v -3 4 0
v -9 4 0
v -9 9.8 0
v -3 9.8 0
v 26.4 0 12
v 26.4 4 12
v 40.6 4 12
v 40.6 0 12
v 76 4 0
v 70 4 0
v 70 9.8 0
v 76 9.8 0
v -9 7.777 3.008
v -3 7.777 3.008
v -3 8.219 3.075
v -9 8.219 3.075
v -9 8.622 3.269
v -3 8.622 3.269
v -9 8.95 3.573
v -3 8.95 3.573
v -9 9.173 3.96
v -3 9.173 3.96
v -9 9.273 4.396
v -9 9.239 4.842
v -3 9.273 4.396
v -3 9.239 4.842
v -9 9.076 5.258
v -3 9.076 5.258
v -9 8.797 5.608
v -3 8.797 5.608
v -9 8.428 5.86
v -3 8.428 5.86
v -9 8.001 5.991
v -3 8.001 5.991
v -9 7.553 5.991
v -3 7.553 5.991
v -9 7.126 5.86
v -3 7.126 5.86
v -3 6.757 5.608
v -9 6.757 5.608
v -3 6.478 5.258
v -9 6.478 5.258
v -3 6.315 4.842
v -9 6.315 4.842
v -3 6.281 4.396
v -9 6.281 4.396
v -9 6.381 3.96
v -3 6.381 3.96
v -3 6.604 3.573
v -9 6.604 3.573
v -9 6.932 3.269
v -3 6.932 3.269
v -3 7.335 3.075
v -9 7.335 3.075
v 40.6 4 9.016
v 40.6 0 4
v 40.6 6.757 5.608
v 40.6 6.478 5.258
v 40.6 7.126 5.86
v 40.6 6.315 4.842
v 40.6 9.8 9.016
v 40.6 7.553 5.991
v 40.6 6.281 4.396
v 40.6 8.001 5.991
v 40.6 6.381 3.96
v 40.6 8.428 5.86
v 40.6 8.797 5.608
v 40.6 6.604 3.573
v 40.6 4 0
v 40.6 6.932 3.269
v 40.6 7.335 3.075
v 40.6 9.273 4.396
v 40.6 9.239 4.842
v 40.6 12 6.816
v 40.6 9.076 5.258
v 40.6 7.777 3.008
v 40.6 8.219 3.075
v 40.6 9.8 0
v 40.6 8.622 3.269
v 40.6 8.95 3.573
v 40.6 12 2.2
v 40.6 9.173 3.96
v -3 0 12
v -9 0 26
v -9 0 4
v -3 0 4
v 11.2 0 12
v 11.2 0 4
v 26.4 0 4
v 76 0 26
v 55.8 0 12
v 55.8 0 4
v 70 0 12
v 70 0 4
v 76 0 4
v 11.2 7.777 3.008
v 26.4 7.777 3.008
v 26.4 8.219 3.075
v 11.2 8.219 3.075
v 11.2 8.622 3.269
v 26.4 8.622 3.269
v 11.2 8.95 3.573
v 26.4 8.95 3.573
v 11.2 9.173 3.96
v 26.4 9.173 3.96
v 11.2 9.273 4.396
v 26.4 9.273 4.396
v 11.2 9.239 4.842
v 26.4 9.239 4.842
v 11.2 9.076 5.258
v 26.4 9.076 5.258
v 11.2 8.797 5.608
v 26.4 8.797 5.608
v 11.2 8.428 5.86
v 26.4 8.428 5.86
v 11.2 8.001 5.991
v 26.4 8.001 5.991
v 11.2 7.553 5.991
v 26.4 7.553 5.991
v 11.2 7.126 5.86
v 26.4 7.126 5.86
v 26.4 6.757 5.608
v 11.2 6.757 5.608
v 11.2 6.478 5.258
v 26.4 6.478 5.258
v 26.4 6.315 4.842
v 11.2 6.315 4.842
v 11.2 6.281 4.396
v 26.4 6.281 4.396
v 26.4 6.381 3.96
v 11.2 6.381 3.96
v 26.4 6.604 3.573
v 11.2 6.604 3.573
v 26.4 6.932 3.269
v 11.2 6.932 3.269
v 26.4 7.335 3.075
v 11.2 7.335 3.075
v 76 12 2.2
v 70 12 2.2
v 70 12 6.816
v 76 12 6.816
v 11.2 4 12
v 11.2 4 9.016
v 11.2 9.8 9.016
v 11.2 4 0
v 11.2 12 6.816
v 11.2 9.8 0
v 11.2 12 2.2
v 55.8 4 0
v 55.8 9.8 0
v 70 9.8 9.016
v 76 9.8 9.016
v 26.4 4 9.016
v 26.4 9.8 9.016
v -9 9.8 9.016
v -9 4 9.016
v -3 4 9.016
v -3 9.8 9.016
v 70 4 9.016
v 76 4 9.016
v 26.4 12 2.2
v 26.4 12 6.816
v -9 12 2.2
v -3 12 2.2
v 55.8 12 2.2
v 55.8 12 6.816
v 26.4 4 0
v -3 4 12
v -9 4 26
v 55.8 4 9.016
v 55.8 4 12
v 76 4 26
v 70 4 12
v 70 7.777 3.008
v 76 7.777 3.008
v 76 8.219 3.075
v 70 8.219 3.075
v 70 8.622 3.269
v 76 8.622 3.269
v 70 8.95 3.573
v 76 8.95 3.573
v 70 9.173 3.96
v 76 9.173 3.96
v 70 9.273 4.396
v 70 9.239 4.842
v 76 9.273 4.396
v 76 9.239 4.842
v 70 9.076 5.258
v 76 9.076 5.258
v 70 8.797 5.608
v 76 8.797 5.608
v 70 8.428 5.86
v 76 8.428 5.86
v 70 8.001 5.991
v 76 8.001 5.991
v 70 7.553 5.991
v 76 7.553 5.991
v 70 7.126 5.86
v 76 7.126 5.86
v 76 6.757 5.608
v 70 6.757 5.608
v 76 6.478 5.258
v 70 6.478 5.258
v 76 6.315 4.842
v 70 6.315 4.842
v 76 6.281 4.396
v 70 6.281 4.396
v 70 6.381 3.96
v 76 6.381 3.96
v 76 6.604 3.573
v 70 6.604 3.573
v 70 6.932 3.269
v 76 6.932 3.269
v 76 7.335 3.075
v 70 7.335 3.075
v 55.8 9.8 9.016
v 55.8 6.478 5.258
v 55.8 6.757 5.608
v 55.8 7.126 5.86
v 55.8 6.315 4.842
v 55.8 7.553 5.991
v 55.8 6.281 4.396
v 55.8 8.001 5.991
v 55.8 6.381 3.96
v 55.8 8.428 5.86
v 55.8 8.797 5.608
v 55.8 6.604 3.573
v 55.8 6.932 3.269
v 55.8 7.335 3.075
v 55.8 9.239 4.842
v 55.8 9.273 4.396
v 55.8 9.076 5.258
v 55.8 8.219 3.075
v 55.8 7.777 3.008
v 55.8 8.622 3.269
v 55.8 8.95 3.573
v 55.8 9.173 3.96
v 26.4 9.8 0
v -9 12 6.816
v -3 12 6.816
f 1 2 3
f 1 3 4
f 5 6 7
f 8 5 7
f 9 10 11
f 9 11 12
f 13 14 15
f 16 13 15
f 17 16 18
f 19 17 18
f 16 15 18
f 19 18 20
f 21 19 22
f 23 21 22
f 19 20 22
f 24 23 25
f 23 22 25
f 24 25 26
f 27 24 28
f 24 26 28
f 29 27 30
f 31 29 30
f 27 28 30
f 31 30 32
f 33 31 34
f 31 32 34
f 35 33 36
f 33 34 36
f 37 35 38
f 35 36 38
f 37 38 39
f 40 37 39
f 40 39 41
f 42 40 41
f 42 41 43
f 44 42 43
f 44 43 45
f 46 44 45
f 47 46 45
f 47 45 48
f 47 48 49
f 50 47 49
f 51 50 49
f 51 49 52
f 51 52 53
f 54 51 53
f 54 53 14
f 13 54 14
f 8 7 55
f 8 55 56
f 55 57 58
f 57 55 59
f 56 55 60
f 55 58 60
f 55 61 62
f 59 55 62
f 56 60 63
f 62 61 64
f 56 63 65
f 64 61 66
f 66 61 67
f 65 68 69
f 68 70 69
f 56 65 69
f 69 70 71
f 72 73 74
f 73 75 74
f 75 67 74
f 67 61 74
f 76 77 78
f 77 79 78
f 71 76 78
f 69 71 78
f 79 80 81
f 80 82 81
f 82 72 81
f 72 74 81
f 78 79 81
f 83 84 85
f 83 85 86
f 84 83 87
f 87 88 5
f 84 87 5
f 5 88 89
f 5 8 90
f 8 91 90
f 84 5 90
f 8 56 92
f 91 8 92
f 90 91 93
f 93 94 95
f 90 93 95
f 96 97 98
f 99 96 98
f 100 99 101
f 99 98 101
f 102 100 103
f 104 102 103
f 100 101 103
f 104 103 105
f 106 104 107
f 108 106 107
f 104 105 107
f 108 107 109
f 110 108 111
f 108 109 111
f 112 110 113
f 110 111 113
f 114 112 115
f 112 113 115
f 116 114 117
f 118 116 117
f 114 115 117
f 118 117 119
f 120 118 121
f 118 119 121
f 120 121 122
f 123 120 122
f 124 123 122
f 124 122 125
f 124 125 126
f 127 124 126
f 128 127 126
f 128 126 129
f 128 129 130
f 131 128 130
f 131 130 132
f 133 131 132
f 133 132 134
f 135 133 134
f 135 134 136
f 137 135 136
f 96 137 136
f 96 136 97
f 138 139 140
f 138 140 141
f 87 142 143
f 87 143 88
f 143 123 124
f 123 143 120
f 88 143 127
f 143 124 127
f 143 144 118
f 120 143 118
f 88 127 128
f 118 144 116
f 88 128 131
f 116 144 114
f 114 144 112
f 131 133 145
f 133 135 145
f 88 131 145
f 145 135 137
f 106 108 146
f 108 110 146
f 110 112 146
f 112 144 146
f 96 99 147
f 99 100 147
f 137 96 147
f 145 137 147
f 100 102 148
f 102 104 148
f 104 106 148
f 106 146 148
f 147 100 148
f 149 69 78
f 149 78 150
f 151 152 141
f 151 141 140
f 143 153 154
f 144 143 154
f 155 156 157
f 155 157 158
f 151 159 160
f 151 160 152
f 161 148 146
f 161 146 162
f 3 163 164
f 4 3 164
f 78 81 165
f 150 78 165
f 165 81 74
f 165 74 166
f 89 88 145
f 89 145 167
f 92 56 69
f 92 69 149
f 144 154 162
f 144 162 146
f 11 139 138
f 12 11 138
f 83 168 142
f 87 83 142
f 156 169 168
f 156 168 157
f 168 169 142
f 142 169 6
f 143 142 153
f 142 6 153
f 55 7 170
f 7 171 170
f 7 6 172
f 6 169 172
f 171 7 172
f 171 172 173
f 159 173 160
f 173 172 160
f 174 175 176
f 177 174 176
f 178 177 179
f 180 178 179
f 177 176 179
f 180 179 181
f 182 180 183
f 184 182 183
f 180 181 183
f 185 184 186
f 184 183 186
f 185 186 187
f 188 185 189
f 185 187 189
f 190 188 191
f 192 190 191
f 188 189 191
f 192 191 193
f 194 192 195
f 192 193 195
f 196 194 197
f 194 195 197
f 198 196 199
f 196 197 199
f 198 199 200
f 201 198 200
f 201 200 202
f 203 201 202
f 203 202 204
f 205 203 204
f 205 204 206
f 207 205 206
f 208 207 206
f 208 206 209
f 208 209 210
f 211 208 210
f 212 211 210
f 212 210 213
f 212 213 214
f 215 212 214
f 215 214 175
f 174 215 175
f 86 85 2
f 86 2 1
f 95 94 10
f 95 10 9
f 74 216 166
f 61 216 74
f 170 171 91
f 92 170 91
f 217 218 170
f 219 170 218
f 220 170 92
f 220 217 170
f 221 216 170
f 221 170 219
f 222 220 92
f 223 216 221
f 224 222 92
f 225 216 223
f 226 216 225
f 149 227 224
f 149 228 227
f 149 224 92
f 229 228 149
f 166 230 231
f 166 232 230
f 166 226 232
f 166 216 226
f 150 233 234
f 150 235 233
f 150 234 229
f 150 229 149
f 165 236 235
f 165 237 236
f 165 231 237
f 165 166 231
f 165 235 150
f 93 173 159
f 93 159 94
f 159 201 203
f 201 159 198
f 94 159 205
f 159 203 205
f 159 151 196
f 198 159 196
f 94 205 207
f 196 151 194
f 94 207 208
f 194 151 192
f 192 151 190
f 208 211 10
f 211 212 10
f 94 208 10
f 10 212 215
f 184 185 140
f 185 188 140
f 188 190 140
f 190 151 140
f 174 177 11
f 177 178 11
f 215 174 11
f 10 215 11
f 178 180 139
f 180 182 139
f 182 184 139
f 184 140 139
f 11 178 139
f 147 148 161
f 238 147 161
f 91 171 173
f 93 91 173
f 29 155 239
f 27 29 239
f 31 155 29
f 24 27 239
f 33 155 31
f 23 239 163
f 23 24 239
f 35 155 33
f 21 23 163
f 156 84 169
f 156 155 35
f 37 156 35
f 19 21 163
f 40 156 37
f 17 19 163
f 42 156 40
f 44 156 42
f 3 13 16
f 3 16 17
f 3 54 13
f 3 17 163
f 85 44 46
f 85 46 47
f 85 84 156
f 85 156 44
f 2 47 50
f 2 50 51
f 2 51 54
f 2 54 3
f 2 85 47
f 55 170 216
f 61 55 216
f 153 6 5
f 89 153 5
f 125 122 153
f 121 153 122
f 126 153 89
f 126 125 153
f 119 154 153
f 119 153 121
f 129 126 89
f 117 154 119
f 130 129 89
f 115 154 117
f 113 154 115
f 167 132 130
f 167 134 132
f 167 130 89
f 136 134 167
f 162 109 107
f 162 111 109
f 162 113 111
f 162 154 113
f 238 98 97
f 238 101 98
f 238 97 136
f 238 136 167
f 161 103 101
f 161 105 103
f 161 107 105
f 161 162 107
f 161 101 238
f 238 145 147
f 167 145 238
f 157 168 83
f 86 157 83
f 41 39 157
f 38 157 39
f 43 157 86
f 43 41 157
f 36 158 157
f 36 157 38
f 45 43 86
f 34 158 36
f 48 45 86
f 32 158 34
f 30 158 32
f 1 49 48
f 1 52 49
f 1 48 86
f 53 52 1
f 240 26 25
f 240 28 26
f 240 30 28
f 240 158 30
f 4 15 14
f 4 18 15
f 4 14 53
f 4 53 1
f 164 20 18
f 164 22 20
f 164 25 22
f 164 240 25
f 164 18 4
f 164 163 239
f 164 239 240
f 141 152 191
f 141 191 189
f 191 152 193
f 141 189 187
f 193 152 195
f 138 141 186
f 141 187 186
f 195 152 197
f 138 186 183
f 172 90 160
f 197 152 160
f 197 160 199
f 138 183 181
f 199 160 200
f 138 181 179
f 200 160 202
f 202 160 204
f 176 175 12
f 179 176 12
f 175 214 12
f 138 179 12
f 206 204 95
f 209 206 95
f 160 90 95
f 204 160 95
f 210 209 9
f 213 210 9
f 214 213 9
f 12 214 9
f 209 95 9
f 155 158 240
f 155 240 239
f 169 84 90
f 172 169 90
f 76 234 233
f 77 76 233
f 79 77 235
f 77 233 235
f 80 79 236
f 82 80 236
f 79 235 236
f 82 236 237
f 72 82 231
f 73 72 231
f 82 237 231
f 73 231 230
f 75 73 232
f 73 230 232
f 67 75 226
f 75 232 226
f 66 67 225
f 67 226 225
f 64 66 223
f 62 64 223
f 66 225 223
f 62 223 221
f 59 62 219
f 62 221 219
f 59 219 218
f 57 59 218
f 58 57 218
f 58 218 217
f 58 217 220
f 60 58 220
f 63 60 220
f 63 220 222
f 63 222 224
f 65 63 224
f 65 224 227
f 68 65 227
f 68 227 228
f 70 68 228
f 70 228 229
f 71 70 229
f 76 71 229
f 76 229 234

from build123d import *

# Parameters (mm, degrees)
SKETCH_1_W          = 85
SKETCH_1_H          = 26
EXTRUDE_1_DEPTH     = 12
SKETCH_2_W          = 19.106704299
SKETCH_2_H          = 9.017669608
CUT_EXTRUDE_1_DEPTH = 90.693923986
CHAMFER_1_SIZE      = 2.2
CHAMFER_2_SIZE      = 4
SKETCH_3_R          = 1.5
CUT_EXTRUDE_2_DEPTH = 90.693923986
SKETCH_4_W          = 14.2
SKETCH_4_H          = 12
CUT_EXTRUDE_3_DEPTH = 82.215762017


with BuildPart() as part:
    # Эскиз1 → Вытянуть1 (new body)
    with BuildSketch(Plane(origin=(0, 0, 0), x_dir=(1, 0, 0), z_dir=(0, 1, 0))):
        with Locations((33.5, -13)):
            Rectangle(SKETCH_1_W, SKETCH_1_H)
    extrude(amount=EXTRUDE_1_DEPTH)

    # Эскиз2 → Вырез-Вытянуть1 (cut, through all)
    with BuildSketch(Plane(origin=(76, 0, 0), x_dir=(0, 0, -1), z_dir=(1, 0, 0))):
        with Locations((-18.569613205, 8.508834804)):
            Rectangle(SKETCH_2_W, SKETCH_2_H)
    extrude(amount=-CUT_EXTRUDE_1_DEPTH, mode=Mode.SUBTRACT)

    # Фаска1
    chamfer_1_edges = [part.edges().sort_by_distance(p)[0] for p in [
        (33.5, 12, 0),
        (33.5, 12, 9.016261055),
    ]]
    chamfer(chamfer_1_edges, length=CHAMFER_1_SIZE)

    # Фаска2
    chamfer_2_edges = [part.edges().sort_by_distance(p)[0] for p in [
        (33.5, 0, 0),
    ]]
    chamfer(chamfer_2_edges, length=CHAMFER_2_SIZE)

    # Эскиз3 → Вырез-Вытянуть2 (cut, through all)
    with BuildSketch(Plane(origin=(76, 0, 0), x_dir=(0, 0, -1), z_dir=(1, 0, 0))):
        with Locations((-4.508130527, 7.777054312)):
            Circle(SKETCH_3_R)
    extrude(amount=-CUT_EXTRUDE_2_DEPTH, mode=Mode.SUBTRACT)

    # Эскиз4 → Вырез-Вытянуть3 (cut, through all)
    with BuildSketch(Plane(origin=(0, 12, 0), x_dir=(1, 0, 0), z_dir=(0, 1, 0))):
        with Locations((4.1, -6)):
            Rectangle(SKETCH_4_W, SKETCH_4_H)
        with Locations((62.9, -6)):
            Rectangle(SKETCH_4_W, SKETCH_4_H)
        with Locations((33.5, -6)):
            Rectangle(SKETCH_4_W, SKETCH_4_H)
    extrude(amount=-CUT_EXTRUDE_3_DEPTH, mode=Mode.SUBTRACT)


solid = part.part
